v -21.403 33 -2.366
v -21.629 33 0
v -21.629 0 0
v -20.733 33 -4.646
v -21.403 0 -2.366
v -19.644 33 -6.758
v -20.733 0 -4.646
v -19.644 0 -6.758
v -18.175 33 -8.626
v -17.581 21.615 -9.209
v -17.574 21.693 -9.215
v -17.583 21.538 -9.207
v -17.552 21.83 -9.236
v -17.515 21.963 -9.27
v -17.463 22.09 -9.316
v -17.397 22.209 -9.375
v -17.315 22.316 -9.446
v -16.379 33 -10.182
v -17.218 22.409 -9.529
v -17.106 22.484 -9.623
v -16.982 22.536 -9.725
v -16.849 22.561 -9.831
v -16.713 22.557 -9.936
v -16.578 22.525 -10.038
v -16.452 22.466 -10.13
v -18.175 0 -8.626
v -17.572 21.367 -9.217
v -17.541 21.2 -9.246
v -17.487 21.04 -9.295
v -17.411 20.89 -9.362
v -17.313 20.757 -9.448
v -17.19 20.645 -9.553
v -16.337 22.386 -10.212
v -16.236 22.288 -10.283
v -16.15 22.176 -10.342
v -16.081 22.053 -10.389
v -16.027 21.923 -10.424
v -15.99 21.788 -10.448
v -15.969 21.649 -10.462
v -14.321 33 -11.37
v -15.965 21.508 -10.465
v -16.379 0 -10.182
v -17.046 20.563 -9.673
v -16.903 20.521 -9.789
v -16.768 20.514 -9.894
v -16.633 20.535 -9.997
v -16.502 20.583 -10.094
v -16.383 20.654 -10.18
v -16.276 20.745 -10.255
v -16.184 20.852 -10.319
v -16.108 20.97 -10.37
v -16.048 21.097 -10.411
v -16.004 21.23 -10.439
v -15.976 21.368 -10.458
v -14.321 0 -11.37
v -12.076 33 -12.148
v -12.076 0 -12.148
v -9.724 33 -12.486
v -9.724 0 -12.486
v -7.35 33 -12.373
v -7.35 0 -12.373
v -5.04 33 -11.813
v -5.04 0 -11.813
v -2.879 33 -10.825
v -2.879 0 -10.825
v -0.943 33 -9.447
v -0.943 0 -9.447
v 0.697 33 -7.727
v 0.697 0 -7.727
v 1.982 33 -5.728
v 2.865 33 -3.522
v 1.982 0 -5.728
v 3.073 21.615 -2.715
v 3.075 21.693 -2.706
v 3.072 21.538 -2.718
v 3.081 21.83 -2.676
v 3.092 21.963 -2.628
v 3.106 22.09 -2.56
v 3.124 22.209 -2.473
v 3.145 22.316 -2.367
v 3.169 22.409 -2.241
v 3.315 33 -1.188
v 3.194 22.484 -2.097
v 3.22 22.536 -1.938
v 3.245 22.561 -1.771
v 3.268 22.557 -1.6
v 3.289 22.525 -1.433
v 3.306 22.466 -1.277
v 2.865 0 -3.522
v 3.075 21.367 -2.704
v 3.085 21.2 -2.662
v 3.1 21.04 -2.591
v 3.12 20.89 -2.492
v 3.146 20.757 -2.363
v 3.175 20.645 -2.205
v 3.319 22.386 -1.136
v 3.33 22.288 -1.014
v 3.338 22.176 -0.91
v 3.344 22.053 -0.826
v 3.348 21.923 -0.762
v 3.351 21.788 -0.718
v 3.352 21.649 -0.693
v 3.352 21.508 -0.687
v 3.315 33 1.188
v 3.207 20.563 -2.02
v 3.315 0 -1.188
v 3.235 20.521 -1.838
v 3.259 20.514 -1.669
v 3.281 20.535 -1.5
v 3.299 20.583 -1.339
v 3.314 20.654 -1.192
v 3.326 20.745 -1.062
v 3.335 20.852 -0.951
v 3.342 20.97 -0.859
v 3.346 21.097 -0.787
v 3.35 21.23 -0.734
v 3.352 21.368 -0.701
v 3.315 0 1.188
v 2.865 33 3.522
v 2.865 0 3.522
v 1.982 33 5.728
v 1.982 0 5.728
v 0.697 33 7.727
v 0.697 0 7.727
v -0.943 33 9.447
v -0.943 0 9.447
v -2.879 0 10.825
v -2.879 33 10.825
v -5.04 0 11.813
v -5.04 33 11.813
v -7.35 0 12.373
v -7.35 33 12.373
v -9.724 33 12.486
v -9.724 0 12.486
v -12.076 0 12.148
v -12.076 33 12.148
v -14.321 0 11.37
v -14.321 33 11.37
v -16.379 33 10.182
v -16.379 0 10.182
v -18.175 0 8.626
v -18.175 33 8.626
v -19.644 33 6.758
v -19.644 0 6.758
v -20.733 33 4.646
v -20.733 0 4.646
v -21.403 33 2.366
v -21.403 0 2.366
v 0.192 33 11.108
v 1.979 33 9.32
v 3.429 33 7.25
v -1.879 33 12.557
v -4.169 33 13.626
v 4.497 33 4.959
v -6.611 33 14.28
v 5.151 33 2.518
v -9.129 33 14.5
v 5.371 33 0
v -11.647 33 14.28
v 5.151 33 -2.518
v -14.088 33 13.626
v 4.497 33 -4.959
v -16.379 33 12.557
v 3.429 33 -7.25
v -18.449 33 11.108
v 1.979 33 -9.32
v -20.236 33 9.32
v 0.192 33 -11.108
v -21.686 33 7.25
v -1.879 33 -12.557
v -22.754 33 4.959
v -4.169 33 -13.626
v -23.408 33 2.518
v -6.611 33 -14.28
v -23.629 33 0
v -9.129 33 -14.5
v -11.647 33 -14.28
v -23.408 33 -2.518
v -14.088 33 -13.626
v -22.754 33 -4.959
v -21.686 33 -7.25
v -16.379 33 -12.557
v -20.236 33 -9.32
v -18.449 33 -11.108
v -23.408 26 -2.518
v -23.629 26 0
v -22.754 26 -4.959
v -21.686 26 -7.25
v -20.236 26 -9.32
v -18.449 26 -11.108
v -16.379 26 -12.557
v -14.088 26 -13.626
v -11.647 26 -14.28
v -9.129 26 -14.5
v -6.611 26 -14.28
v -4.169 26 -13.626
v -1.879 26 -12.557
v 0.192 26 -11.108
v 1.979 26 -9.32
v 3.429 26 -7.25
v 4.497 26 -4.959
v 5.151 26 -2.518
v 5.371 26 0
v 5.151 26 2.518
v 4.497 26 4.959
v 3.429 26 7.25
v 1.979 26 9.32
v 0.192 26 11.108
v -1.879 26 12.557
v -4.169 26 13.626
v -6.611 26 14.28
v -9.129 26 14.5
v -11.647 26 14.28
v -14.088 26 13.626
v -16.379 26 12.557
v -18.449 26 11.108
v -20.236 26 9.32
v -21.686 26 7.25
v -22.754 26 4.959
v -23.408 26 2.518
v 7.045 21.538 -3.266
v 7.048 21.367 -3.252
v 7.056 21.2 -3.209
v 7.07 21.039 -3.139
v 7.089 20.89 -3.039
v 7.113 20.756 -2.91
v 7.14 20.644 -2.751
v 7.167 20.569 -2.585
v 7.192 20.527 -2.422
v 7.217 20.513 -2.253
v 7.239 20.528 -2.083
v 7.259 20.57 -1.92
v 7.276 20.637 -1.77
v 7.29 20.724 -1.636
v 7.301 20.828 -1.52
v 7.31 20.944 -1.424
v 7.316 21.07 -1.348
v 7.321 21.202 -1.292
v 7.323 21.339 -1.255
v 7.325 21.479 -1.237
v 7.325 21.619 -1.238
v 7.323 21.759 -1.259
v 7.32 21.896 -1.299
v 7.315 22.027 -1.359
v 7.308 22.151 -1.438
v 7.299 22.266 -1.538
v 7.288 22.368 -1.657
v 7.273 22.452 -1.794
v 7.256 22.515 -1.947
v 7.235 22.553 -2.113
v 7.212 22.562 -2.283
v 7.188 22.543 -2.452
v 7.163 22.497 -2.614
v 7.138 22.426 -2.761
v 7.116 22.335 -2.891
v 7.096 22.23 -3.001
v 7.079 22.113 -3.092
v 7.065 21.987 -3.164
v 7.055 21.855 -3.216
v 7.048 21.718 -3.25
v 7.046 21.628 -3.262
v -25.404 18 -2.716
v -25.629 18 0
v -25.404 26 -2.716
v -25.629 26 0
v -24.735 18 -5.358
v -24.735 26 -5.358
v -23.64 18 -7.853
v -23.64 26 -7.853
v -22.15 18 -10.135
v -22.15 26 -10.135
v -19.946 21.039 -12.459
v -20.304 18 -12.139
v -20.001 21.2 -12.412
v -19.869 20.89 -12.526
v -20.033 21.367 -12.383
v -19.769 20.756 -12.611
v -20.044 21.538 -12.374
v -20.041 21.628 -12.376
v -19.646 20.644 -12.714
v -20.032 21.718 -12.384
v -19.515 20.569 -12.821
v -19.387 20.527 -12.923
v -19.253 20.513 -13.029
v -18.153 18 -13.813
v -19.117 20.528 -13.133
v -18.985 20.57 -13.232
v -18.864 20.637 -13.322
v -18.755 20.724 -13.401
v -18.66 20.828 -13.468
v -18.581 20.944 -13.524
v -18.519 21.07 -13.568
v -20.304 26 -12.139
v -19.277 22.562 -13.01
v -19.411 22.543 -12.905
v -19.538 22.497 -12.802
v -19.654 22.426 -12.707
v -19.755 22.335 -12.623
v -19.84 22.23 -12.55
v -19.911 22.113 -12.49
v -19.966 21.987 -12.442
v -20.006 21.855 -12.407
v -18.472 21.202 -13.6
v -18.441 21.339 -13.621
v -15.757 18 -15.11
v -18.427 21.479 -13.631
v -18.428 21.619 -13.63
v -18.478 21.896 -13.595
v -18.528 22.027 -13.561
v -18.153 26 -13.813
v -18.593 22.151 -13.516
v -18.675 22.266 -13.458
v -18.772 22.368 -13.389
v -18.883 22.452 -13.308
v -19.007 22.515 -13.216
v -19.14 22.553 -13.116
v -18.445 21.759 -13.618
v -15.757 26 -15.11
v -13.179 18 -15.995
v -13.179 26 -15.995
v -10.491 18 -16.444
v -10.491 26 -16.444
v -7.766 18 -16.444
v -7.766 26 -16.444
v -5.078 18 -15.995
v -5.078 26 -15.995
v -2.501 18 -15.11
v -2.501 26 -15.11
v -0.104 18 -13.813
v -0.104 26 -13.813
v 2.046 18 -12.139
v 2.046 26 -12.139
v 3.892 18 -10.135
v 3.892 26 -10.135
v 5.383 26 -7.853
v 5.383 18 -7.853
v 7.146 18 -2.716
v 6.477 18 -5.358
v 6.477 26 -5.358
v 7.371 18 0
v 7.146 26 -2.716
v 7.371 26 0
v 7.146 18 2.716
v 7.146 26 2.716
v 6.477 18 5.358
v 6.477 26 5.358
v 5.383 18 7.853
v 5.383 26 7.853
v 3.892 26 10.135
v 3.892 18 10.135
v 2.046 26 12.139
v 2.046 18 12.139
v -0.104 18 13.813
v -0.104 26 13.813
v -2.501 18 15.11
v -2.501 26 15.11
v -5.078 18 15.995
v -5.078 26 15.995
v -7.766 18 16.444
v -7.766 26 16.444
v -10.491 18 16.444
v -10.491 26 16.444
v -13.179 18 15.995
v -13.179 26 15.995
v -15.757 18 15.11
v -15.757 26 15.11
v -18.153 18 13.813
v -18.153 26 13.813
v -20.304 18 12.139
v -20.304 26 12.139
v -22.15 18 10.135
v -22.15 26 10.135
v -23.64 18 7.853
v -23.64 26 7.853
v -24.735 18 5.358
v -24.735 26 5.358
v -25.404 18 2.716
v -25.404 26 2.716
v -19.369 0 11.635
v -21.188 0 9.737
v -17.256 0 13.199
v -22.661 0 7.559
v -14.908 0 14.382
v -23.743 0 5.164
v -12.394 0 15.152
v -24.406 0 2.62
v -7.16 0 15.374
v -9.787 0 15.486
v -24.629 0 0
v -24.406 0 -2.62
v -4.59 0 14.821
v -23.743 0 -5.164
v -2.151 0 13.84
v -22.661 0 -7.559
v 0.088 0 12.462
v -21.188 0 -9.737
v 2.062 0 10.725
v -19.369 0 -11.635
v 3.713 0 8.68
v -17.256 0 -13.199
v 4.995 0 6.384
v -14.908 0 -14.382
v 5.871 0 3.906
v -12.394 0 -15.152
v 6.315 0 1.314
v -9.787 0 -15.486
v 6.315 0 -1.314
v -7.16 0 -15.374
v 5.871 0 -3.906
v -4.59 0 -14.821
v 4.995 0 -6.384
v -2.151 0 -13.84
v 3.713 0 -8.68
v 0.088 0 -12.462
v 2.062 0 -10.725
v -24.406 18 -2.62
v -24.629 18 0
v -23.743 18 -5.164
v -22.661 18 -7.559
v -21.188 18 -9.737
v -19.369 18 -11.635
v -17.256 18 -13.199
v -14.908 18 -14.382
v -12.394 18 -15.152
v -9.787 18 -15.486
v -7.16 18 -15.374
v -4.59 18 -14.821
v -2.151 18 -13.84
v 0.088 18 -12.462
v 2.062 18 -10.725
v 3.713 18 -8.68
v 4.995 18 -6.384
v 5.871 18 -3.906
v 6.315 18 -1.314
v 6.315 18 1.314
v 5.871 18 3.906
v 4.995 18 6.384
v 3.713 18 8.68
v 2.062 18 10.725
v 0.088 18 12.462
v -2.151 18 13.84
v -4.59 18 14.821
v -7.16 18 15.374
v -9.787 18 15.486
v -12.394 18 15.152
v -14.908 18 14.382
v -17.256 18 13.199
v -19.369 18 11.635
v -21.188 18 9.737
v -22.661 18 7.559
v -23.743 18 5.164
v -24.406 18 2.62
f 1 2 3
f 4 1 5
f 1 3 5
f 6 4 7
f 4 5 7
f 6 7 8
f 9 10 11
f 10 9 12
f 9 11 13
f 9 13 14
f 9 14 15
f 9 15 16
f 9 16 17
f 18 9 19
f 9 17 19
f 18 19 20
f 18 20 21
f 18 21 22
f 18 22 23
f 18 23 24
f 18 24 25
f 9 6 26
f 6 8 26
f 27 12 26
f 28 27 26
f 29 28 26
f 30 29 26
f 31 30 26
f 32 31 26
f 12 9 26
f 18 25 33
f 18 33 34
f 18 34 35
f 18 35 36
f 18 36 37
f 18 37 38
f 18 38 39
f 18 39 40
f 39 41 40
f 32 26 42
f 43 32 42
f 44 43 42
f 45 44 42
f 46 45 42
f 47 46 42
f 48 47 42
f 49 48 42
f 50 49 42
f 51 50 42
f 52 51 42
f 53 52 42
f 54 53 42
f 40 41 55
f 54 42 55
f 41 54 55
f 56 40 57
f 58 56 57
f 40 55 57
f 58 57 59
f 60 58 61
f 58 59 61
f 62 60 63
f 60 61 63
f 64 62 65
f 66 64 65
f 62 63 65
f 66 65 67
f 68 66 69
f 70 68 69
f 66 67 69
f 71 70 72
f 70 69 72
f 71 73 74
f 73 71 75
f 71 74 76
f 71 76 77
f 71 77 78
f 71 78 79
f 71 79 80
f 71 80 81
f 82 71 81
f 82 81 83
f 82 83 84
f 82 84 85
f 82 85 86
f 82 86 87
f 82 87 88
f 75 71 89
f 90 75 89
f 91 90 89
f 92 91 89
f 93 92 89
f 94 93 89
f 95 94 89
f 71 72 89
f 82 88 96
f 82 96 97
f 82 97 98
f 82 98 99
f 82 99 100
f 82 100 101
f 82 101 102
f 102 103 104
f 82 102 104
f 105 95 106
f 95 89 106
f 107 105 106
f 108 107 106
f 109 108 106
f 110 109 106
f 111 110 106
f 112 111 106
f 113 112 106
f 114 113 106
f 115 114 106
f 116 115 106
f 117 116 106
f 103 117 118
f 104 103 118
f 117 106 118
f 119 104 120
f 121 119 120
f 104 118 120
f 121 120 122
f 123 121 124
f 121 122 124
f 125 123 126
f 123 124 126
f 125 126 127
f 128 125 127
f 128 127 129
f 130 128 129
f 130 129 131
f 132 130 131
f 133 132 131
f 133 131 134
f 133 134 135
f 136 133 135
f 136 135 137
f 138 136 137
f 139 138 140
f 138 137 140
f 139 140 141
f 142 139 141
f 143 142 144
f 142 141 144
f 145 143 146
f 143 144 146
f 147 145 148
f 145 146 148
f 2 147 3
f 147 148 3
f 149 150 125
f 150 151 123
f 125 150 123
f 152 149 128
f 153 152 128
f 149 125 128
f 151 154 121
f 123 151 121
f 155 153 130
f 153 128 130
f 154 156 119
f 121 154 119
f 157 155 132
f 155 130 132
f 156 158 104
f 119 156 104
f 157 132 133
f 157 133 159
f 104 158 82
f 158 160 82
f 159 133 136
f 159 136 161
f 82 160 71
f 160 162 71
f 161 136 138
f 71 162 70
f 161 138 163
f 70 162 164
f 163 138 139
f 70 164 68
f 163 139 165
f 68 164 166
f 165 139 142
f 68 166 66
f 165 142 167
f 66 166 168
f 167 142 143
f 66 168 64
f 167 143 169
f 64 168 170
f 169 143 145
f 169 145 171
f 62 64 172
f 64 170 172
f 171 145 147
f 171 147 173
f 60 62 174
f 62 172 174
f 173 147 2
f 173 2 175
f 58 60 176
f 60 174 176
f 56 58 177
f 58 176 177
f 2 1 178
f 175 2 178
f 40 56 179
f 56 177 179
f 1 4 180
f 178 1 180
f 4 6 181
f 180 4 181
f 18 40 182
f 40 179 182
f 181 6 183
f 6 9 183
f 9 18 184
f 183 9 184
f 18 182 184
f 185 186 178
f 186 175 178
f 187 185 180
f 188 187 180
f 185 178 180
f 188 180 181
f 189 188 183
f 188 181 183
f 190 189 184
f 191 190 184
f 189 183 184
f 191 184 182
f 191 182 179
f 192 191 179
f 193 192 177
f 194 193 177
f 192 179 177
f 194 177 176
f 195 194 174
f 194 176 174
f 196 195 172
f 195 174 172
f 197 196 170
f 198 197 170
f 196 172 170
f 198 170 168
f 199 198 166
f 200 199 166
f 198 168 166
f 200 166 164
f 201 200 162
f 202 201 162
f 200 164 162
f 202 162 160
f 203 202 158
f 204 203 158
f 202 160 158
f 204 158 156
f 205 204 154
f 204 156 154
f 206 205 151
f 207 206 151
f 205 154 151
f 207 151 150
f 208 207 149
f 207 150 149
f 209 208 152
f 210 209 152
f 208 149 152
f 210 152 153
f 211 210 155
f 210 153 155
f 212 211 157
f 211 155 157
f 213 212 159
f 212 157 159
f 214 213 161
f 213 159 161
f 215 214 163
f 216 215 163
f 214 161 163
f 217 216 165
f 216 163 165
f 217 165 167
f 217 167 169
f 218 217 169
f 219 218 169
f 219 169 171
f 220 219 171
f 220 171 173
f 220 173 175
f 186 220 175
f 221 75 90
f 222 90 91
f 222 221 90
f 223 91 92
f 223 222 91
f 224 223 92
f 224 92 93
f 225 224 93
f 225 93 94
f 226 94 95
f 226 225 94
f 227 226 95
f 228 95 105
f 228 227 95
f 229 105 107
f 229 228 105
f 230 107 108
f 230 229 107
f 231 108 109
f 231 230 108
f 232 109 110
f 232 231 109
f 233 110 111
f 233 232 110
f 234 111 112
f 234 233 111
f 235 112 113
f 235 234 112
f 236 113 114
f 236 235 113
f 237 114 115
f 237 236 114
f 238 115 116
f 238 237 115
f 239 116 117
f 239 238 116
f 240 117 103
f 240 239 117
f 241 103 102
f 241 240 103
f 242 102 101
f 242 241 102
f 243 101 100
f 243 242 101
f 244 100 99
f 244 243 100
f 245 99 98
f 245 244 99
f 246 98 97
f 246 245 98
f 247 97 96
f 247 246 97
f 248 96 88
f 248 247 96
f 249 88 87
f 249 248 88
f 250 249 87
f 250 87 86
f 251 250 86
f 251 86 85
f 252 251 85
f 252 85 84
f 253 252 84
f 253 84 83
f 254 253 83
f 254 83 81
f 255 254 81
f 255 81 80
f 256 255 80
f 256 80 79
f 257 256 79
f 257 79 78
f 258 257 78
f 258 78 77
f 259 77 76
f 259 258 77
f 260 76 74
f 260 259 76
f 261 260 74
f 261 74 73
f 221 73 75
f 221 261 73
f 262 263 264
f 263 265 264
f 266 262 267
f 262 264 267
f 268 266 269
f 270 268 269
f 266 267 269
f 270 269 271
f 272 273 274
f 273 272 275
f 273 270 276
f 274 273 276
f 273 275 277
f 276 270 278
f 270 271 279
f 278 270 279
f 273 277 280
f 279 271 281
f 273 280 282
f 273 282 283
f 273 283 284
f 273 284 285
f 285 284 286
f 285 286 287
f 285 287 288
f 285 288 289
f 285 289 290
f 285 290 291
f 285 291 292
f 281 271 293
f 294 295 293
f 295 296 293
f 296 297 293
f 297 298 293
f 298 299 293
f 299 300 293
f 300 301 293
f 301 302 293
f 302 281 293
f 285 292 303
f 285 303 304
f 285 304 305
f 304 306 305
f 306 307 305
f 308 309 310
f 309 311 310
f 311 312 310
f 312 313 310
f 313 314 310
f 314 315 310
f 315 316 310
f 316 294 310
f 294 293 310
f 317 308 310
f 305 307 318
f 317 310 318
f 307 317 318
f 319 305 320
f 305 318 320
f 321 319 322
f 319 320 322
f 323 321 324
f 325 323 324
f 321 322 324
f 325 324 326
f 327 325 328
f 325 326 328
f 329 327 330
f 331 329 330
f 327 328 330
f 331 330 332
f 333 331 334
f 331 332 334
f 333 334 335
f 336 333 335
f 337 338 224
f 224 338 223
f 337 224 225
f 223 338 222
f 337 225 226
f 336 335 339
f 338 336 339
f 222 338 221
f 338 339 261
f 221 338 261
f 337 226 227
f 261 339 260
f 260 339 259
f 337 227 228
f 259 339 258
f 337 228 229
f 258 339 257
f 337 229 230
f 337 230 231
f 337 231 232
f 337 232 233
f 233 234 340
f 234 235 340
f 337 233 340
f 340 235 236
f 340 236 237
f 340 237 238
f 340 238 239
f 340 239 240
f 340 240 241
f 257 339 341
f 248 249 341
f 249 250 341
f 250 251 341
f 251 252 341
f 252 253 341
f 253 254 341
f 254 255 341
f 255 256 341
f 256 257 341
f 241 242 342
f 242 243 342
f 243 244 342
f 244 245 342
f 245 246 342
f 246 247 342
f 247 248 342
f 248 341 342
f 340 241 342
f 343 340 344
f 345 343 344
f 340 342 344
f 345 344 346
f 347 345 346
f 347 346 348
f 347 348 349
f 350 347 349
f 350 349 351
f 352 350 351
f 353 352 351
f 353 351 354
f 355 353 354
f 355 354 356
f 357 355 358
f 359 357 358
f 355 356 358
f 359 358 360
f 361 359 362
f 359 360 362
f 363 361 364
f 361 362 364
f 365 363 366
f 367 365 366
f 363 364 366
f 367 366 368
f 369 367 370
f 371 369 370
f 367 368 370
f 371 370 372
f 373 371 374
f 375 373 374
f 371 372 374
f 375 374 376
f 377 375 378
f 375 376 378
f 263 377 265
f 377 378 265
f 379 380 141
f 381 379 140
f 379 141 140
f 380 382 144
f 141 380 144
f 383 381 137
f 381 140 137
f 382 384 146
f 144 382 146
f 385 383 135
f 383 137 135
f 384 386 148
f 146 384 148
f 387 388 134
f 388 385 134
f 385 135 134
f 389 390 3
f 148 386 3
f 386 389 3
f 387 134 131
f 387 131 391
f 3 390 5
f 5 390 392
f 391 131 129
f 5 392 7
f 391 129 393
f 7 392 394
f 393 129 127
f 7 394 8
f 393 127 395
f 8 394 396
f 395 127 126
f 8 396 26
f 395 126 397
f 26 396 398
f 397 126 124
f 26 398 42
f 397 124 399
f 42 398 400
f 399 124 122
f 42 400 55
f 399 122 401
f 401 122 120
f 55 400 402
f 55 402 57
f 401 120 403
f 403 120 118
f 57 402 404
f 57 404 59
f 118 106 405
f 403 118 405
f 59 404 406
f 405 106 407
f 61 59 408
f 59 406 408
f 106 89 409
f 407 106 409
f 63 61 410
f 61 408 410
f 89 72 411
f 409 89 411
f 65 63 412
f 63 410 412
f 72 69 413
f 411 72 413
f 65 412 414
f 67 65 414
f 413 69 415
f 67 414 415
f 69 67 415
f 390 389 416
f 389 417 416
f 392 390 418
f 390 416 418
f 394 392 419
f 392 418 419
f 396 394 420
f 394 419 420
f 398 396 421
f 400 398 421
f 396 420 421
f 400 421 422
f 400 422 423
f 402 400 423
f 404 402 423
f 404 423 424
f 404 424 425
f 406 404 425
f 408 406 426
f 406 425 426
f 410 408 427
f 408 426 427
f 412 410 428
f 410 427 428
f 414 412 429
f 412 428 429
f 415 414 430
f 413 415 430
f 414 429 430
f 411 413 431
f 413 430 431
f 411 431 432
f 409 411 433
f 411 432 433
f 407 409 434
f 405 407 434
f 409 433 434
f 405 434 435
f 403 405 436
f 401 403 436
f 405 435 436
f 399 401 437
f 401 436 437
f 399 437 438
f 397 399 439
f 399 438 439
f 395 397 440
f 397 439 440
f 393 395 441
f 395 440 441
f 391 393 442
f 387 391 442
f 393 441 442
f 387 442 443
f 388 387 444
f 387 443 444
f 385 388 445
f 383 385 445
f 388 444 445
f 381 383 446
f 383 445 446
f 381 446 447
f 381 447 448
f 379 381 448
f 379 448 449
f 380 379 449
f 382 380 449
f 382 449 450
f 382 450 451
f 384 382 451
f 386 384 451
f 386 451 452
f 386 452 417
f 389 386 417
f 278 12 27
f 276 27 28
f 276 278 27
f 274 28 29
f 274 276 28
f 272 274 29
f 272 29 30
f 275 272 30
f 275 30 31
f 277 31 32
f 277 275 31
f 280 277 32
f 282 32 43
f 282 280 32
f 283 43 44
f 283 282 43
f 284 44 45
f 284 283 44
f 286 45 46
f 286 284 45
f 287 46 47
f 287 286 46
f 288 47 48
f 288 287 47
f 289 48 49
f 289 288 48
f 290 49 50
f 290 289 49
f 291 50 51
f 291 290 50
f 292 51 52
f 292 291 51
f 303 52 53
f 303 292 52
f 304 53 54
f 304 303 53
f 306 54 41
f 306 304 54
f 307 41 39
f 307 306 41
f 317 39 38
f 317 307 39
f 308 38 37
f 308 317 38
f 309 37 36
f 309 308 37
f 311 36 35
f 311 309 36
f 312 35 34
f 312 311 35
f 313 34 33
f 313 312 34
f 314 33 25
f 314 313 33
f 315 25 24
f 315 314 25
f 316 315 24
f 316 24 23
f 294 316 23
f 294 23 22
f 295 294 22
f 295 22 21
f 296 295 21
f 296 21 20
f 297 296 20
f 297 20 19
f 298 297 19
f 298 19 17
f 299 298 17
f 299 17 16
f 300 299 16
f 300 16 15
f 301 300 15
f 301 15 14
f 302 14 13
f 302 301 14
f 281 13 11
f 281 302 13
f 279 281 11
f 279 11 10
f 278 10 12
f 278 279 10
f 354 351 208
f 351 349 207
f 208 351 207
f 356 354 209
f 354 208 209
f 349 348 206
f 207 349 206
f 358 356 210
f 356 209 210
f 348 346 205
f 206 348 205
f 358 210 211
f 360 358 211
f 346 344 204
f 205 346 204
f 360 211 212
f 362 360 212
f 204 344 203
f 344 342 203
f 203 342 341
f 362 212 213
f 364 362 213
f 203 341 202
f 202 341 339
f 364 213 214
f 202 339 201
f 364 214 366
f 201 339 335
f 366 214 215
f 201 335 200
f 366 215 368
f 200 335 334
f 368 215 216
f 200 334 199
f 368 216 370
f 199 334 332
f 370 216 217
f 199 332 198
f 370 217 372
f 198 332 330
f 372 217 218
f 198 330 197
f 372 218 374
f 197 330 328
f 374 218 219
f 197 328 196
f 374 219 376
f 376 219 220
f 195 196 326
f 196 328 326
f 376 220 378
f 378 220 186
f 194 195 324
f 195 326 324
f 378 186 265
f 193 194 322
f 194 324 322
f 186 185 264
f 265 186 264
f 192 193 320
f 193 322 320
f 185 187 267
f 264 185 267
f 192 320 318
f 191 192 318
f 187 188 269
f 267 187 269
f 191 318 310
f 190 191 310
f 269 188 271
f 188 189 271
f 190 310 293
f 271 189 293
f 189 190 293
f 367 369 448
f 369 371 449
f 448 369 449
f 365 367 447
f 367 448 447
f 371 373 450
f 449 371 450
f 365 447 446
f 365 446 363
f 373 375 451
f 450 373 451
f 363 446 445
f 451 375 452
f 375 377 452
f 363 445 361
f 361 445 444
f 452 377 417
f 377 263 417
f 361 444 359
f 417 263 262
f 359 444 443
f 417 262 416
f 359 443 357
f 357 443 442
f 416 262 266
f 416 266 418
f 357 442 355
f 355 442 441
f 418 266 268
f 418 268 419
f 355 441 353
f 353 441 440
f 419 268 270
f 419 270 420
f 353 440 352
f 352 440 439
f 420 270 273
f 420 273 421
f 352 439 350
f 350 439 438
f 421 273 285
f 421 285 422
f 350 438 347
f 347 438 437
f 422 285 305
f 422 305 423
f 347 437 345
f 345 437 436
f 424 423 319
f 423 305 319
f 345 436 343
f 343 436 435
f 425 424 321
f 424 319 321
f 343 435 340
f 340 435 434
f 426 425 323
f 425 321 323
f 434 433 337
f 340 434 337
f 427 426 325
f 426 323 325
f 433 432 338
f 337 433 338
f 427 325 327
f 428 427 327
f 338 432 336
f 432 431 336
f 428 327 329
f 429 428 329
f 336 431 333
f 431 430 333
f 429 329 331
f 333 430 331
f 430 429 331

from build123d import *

# Parameters (mm, degrees)
MATRIZC1_COUNT = 3


with BuildPart() as part:
    # Croquis1 → Revolución1 (revolve)
    with BuildSketch(Plane.XY, mode=Mode.PRIVATE) as revoluci_n1_sk:
        Polygon((6.371214478, 0), (6.371214478, 18), (7.371214478, 18), (7.371214478, 26), (5.371214478, 26), (5.371214478, 33), (3.371214478, 33), (3.371214478, 0), align=None)
    revolve(revoluci_n1_sk.sketch.rotate(Axis((-9.128785522, 76.373603091, 0), (0, -1, 0)), 180), axis=Axis((-9.128785522, 76.373603091, 0), (0, -1, 0)))

    # Croquis2 → Perforador para roscar para macho de roscar para M2.5x0.451 (revolve, cut)
    with BuildSketch(Plane(origin=(7.216426647, 21.537901264, -2.254781399), x_dir=(-0.13665341811634468, 0, -0.9906189193212089), z_dir=(0, 1, 0))):
        Polygon((0, 0), (0, 10.615882135), (1.025, 10), (1.025, 0), align=None)
    perforador_para_roscar_para_macho_de_ros = revolve(axis=Axis((13.506856785, 21.537901264, -3.122530604), (-0.9906189193212088, 0, 0.13665341811634468)), mode=Mode.SUBTRACT)

    # MatrizC1: Perforador para roscar para macho de roscar para M2.5x0.451 ×3 about axis, 1 skipped
    matrizc1_axis = Axis((-9.128785522, 26, 0), (0, 1, 0))
    add([perforador_para_roscar_para_macho_de_ros.rotate(matrizc1_axis, i * 360 / MATRIZC1_COUNT) for i in range(1, MATRIZC1_COUNT) if i not in (2,)], mode=Mode.SUBTRACT)


solid = part.part
